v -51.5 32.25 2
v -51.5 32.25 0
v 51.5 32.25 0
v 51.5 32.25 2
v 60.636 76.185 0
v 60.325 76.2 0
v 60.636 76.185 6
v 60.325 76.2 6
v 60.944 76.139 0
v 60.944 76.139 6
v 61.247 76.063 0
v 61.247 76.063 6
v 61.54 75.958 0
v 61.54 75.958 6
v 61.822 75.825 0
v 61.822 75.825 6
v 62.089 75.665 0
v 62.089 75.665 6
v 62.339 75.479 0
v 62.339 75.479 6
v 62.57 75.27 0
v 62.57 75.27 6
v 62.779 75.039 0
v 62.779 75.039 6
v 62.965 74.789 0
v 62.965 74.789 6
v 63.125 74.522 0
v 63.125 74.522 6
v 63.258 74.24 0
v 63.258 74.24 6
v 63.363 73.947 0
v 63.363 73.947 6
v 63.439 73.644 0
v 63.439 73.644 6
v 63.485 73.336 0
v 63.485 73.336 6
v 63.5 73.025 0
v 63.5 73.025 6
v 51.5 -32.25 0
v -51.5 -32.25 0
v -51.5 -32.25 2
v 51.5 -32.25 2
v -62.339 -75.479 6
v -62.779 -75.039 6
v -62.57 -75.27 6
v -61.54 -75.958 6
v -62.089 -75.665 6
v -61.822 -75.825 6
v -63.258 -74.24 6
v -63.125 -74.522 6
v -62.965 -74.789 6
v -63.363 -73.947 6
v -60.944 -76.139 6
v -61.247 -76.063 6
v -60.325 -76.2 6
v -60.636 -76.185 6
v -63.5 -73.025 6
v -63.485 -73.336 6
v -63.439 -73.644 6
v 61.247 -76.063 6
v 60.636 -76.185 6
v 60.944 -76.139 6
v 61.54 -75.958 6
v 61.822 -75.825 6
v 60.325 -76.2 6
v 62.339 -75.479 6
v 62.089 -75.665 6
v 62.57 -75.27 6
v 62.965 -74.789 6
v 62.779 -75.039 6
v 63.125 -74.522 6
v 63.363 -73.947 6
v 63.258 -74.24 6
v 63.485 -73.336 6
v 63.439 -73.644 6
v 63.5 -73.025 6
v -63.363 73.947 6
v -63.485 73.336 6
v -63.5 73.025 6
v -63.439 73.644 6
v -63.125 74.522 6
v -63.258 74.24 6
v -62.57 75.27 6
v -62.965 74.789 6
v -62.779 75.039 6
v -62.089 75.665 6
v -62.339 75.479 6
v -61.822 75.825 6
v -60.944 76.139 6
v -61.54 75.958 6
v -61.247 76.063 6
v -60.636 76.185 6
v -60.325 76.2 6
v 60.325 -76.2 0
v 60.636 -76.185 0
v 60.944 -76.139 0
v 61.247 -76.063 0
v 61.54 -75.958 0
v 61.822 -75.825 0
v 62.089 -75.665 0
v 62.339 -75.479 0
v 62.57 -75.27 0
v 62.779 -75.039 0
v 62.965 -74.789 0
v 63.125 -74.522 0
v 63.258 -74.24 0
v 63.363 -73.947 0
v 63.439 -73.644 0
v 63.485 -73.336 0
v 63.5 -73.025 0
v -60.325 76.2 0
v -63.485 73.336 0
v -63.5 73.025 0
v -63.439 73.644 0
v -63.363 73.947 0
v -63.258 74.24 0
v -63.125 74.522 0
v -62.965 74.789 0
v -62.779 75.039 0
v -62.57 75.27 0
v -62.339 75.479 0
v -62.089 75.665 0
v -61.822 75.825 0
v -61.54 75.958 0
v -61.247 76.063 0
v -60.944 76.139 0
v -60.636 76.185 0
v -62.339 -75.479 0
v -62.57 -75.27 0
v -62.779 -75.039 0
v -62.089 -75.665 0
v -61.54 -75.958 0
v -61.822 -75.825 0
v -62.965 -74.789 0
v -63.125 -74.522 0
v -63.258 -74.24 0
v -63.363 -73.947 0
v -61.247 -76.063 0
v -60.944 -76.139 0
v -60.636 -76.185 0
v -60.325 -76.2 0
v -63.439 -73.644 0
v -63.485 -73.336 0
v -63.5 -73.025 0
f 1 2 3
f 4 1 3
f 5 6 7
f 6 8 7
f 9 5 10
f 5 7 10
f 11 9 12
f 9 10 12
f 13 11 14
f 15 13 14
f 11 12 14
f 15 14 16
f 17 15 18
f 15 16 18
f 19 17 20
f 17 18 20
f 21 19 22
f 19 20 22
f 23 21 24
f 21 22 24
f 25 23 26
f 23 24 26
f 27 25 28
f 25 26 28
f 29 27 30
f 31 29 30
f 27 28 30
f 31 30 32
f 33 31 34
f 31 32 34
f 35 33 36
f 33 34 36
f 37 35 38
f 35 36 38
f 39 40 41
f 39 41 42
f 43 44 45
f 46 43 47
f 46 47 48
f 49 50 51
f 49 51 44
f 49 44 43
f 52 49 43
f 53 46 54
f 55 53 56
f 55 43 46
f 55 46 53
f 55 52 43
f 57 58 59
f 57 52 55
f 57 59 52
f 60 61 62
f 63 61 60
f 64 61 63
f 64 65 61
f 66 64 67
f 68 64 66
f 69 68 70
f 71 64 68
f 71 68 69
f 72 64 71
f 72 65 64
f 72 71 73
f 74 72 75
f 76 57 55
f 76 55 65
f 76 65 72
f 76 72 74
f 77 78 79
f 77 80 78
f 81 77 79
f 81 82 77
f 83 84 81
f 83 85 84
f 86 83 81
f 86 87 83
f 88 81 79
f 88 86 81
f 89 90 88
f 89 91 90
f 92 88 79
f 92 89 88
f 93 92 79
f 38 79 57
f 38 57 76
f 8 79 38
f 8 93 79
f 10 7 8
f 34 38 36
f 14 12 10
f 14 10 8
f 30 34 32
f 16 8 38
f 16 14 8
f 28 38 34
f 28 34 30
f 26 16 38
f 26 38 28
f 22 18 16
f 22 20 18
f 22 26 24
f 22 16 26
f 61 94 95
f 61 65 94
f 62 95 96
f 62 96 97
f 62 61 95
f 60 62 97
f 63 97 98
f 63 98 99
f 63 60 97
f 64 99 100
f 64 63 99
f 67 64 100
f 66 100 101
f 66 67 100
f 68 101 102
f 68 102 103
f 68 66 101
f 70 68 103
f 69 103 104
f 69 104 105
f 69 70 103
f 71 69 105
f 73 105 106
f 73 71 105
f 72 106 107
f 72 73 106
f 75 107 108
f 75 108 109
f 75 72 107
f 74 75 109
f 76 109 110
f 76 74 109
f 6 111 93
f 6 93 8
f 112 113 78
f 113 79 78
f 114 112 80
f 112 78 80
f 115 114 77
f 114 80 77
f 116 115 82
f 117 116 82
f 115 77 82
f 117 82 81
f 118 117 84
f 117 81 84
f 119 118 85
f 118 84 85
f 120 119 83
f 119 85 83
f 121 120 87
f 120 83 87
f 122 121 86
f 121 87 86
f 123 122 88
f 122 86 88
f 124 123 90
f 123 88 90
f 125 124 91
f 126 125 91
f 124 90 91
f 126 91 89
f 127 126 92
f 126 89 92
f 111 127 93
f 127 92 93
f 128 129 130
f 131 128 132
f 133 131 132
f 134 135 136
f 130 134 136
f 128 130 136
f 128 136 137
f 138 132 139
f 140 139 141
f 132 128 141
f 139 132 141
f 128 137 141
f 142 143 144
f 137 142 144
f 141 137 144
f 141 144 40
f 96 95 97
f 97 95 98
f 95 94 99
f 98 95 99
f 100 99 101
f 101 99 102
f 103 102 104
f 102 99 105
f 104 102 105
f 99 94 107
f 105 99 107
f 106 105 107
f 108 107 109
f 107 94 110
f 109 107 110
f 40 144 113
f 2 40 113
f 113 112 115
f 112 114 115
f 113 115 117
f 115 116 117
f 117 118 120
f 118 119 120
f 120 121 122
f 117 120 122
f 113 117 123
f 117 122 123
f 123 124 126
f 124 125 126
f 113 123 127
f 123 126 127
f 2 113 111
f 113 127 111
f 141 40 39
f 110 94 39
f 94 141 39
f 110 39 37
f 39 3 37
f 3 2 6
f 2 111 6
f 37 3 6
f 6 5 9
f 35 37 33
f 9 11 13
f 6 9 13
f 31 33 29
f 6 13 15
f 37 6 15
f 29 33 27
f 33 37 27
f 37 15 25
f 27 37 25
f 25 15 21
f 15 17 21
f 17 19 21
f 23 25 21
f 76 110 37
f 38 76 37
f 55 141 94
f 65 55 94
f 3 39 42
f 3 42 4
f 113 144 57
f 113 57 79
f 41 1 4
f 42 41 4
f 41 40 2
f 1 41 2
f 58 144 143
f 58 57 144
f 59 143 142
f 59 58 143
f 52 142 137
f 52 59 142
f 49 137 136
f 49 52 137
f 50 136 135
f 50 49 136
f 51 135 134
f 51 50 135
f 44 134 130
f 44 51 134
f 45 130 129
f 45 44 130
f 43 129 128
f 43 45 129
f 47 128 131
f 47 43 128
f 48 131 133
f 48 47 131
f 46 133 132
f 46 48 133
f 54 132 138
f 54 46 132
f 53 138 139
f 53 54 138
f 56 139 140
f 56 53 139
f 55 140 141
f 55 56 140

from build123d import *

# Parameters (mm, degrees)
F0_W     = 127
F0_H     = 152.4
F0_W_2   = 103
F0_H_2   = 64.5
F1_DEPTH = 6
F2_DEPTH = 2
F3_R     = 3.175


with BuildPart() as f1:
    # F0 (on Top) → F1 (new body)
    with BuildSketch(Plane.XY):
        Rectangle(F0_W, F0_H)
        Rectangle(F0_W_2, F0_H_2, mode=Mode.SUBTRACT)
        Rectangle(F0_W_2, F0_H_2)
    extrude(amount=F1_DEPTH)

    # F0 (on Top) → F2 (cut)
    with BuildSketch(Plane.XY):
        Rectangle(F0_W_2, F0_H_2)
    extrude(amount=F2_DEPTH, mode=Mode.SUBTRACT)

    # F3
    f3_edges = [f1.edges().sort_by_distance(p)[0] for p in [
        (63.5, -76.2, 3),
        (-63.5, -76.2, 3),
        (63.5, 76.2, 3),
        (-63.5, 76.2, 3),
    ]]
    fillet(f3_edges, radius=F3_R)


solid = f1.part
